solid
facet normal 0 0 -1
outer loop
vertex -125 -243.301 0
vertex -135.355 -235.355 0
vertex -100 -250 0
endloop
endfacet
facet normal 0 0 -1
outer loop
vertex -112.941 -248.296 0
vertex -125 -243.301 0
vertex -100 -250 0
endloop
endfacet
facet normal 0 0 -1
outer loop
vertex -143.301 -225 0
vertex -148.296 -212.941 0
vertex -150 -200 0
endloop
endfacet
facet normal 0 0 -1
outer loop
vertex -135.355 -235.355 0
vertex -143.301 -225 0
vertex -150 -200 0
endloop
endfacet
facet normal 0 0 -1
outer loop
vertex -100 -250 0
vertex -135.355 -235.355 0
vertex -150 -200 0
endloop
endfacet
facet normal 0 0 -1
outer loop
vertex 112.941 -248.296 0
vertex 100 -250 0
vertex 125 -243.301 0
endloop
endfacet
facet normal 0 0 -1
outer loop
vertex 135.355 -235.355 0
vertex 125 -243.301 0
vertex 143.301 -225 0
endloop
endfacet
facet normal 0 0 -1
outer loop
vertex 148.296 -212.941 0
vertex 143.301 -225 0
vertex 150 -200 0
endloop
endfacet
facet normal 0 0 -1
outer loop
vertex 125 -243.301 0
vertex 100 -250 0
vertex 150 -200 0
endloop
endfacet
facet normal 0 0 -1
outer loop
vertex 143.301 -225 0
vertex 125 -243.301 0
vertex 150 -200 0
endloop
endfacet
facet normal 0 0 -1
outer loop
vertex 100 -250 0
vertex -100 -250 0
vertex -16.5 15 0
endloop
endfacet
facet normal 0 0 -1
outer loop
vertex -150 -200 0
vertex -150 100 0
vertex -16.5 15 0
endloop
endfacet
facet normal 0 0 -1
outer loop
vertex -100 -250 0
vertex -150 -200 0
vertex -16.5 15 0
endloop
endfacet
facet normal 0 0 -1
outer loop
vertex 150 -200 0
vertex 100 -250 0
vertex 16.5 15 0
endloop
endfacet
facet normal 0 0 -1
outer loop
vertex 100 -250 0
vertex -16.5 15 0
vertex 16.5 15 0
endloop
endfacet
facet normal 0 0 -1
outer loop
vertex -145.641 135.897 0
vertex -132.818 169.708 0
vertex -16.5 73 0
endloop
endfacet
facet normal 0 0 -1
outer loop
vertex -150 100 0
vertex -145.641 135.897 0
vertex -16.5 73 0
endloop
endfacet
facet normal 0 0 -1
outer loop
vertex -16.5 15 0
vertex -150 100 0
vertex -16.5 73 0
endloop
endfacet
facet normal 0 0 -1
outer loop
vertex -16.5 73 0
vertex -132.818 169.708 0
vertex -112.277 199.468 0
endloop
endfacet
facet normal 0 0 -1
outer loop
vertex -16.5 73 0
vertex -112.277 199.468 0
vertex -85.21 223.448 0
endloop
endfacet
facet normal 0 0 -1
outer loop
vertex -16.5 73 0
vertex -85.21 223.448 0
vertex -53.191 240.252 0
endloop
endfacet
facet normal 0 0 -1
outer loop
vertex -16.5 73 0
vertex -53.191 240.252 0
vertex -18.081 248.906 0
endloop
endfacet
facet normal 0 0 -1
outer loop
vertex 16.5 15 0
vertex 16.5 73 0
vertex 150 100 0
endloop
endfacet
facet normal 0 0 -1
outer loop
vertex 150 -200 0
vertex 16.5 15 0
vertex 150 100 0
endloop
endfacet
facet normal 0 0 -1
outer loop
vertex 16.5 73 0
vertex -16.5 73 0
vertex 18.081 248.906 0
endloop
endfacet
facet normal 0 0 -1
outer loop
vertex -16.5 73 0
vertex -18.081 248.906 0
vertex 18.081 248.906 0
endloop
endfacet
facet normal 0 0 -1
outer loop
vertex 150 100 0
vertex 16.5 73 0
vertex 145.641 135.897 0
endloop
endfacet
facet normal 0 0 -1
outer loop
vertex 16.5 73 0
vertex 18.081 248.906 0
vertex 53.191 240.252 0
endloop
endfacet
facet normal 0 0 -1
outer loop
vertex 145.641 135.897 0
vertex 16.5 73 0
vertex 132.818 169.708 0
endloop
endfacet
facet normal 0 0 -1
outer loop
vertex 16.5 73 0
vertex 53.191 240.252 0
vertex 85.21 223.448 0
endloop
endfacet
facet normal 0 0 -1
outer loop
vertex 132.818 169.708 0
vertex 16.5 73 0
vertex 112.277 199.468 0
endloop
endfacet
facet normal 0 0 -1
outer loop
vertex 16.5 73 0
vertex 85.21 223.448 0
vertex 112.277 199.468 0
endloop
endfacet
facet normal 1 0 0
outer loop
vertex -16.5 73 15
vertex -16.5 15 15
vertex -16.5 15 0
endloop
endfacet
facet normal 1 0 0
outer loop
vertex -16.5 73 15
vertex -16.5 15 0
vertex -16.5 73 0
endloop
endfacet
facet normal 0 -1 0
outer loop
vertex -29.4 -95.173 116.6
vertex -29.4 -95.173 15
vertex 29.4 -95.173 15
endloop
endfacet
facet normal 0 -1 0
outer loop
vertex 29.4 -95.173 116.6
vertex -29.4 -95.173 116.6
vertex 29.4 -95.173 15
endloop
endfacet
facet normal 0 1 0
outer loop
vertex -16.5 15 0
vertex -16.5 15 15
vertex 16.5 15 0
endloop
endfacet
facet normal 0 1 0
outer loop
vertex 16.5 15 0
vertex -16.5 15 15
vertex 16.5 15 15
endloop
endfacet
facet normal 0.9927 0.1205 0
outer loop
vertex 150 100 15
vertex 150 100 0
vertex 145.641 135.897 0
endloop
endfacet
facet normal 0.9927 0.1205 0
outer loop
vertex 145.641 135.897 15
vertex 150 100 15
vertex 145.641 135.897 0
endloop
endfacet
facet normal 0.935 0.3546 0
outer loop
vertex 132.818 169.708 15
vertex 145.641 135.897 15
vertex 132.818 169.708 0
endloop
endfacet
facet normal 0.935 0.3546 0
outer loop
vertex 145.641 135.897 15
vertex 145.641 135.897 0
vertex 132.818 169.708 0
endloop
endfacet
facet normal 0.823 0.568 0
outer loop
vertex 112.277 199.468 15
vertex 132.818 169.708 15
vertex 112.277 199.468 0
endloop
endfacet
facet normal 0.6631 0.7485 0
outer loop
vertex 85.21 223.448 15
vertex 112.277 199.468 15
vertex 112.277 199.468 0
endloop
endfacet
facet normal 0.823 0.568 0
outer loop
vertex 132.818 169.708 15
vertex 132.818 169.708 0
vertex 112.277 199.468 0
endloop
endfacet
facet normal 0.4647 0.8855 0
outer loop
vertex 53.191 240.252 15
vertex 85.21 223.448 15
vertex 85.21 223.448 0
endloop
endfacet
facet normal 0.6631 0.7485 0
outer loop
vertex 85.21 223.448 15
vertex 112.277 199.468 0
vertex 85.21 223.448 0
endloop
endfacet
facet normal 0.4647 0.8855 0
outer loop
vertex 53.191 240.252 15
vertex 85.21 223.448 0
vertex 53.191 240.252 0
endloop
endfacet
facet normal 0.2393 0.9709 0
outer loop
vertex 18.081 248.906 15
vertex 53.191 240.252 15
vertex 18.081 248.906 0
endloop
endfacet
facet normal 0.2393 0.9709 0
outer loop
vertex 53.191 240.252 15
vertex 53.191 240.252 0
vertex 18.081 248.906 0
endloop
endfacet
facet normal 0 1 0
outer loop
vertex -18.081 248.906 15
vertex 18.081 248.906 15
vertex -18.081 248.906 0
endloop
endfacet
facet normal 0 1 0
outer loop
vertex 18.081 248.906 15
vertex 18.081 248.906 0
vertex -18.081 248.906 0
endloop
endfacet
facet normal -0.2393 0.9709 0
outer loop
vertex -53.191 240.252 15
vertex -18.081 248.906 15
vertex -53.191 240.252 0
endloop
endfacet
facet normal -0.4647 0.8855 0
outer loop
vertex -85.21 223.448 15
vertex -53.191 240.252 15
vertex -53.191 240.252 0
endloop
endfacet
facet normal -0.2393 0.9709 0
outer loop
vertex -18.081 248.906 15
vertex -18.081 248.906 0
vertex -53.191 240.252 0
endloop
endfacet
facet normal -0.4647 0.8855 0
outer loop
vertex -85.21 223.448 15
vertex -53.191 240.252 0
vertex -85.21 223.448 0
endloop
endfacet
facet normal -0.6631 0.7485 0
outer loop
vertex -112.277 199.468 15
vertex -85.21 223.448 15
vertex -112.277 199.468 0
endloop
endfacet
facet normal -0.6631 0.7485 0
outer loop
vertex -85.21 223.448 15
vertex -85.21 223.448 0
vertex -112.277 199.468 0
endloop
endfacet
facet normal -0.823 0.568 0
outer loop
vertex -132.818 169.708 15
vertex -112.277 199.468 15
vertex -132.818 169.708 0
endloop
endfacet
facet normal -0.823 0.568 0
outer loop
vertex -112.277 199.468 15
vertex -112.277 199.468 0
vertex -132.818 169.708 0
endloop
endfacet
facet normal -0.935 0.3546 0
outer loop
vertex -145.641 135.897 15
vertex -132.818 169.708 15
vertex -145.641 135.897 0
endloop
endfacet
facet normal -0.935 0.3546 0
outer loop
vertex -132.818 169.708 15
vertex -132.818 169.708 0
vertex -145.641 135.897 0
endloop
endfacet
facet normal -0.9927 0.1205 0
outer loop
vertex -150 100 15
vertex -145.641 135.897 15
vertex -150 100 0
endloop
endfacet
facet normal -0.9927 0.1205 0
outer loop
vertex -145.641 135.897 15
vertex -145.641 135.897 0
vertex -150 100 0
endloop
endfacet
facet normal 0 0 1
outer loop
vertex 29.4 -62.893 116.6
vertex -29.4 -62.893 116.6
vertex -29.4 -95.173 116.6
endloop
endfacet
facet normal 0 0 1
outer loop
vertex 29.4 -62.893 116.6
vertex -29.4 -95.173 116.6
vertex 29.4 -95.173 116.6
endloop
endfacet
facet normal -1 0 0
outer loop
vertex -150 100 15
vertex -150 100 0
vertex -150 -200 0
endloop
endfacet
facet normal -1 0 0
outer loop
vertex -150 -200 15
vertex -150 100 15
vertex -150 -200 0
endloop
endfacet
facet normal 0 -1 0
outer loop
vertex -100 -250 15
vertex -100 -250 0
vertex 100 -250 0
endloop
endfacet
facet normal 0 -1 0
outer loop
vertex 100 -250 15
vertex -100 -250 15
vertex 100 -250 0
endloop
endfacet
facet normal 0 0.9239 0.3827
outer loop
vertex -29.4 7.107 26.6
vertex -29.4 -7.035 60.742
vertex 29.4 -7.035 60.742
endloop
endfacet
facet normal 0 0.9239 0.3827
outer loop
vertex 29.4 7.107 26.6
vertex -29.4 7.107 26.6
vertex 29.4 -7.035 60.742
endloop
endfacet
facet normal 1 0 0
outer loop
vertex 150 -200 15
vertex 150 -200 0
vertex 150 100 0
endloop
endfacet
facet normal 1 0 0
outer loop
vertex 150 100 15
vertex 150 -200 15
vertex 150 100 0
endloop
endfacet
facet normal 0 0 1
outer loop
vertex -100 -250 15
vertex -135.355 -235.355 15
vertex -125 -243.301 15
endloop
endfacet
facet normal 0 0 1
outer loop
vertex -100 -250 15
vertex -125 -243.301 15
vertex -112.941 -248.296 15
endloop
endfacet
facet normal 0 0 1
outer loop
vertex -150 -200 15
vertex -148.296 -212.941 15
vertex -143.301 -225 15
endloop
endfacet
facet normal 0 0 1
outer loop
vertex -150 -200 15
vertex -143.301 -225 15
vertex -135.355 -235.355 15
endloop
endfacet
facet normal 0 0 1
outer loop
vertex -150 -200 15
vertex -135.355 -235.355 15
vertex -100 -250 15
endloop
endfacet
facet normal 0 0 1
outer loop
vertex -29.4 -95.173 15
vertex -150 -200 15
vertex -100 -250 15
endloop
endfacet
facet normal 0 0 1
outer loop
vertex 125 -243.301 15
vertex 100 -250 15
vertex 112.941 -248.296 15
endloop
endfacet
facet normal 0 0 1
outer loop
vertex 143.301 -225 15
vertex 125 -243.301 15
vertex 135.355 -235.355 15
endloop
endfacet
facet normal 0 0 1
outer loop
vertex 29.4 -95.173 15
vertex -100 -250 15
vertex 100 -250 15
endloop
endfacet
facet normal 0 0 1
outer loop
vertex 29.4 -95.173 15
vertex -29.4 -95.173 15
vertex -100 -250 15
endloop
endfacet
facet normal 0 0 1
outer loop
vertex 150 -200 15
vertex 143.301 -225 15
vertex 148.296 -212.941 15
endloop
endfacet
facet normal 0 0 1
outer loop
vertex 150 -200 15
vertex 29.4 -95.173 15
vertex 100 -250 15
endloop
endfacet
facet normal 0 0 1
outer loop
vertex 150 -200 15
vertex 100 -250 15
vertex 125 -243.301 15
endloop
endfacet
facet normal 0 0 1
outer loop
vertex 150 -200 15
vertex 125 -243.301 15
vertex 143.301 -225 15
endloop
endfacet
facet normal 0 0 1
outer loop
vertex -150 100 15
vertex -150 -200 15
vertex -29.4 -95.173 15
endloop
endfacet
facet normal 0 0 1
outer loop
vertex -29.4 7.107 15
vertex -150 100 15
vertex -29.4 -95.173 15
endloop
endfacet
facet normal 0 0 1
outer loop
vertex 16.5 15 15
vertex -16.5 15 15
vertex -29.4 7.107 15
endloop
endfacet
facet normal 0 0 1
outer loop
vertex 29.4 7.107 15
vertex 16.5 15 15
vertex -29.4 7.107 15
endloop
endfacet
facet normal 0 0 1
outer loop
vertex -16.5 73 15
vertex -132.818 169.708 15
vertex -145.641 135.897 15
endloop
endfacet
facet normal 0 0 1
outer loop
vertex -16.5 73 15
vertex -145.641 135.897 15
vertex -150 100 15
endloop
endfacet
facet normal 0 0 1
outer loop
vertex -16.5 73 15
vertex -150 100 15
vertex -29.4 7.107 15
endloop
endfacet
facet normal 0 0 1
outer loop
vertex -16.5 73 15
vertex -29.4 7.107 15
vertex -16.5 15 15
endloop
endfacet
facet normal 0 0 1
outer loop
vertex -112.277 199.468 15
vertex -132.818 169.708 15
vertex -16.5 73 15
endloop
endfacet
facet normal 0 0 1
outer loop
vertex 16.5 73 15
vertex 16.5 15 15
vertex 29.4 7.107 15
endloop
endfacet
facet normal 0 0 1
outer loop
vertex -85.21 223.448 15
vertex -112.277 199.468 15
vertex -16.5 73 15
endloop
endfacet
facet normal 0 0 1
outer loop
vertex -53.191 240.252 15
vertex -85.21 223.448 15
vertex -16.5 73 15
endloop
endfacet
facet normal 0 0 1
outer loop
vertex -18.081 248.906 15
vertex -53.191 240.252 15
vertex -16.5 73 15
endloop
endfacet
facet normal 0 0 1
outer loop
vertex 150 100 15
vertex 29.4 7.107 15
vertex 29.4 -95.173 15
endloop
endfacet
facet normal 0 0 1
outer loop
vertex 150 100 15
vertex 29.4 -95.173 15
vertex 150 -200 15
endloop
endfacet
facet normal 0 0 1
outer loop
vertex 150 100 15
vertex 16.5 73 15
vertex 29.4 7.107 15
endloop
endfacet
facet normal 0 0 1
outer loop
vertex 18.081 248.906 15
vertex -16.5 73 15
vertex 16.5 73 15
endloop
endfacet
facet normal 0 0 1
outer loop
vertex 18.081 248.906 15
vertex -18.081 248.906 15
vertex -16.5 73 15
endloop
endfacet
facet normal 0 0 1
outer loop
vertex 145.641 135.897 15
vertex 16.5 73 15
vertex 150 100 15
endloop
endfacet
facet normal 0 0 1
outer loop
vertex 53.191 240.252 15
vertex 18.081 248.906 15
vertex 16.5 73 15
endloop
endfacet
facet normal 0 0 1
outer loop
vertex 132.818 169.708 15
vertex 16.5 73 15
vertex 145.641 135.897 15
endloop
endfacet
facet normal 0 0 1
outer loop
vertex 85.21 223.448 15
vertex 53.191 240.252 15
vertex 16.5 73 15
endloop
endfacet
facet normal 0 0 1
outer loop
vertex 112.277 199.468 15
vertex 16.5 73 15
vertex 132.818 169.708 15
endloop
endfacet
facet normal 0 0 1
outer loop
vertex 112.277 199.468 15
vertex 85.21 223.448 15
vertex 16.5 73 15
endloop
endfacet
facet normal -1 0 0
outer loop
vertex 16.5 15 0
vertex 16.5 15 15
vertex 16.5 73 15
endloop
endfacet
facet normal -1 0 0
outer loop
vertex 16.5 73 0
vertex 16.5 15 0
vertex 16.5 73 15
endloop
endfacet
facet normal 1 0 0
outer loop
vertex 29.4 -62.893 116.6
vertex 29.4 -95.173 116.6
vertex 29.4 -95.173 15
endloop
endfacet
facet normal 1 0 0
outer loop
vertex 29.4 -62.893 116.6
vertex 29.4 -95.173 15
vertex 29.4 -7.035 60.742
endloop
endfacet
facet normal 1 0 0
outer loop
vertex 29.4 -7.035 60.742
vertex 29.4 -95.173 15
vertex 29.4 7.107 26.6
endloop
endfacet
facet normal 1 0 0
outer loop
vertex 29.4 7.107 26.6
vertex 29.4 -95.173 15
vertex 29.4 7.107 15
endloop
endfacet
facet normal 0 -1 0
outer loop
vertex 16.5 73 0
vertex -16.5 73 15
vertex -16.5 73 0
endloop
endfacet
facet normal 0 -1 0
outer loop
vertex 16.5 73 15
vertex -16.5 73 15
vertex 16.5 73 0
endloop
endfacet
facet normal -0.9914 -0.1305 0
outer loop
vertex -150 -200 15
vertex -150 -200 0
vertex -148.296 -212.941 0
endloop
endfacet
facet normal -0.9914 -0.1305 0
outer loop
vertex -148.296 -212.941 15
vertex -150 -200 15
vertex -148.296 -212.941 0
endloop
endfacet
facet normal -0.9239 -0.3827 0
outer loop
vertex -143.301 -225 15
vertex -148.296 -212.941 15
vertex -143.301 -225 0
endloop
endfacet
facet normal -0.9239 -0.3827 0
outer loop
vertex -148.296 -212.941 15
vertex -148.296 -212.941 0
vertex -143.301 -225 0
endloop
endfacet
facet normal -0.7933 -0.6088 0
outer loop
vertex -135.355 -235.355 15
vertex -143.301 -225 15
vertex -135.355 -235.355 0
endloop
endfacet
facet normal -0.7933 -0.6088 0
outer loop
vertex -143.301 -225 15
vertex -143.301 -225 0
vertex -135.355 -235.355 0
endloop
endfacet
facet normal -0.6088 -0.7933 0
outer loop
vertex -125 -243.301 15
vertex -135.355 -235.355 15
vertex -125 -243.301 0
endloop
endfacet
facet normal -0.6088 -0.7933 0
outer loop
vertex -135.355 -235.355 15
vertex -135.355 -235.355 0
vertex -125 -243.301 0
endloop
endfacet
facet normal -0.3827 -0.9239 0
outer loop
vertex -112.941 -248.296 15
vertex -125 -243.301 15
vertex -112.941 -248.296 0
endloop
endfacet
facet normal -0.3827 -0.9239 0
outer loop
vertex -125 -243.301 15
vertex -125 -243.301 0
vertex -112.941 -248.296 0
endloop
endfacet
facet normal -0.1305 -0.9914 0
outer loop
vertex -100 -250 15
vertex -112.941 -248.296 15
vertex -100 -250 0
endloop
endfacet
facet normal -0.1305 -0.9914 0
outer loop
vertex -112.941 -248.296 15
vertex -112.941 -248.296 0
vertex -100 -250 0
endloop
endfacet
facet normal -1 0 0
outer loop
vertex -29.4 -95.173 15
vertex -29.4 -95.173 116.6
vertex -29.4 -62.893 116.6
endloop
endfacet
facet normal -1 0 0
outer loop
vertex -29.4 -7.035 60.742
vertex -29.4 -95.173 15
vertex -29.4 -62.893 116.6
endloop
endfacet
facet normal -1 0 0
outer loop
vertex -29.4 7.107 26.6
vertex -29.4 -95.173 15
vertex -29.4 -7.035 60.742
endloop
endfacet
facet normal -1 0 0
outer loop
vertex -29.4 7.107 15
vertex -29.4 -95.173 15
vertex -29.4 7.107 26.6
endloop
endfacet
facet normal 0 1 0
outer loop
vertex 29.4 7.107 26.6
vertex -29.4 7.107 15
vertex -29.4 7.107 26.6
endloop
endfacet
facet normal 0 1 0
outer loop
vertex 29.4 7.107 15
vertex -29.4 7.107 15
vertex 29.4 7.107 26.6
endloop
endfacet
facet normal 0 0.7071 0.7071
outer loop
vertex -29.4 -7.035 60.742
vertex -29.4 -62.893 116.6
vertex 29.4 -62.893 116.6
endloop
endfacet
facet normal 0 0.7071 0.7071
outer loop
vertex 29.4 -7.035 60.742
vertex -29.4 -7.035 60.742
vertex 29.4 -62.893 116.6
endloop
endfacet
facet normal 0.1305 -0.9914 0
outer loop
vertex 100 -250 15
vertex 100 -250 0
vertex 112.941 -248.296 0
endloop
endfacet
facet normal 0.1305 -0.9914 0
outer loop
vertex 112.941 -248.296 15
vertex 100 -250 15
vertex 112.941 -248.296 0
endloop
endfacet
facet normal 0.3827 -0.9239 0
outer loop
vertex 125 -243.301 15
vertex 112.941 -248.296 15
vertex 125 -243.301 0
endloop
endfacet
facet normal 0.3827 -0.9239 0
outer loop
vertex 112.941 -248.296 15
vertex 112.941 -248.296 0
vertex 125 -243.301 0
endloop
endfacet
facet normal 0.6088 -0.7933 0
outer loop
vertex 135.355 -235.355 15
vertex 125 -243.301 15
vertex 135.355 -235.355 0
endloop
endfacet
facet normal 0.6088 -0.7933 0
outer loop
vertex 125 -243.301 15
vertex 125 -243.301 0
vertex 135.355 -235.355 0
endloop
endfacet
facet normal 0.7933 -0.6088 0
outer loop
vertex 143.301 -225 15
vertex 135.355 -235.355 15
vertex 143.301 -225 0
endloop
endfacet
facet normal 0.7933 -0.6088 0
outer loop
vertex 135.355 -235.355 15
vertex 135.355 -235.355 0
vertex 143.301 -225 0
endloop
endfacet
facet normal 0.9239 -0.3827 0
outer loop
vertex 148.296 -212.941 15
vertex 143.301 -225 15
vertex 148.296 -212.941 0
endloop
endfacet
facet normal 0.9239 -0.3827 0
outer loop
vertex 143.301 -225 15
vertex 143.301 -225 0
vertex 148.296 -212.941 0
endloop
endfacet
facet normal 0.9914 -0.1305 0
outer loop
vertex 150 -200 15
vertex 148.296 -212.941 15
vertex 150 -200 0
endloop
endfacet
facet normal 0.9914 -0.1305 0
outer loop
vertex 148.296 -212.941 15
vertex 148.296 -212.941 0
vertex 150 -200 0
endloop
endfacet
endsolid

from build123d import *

# Parameters (mm, degrees)
F1_DEPTH = 15
F2_W     = 33
F2_H     = 58
F3_DEPTH = 15.001
F4_W     = 58.8
F4_H     = 102.2799882368
F5_DEPTH = 101.6
F6_SIZE  = 70
F7_SIZE  = 20


with BuildPart() as f1:
    # F0 (on Top) → F1 (new body)
    with BuildSketch(Plane.XY):
        with BuildLine():
            Line((-100, -250), (100, -250))
            ThreePointArc((100, -250), (135.3553390593, -235.3553390593), (150, -200))
            Line((150, -200), (150, 100))
            ThreePointArc((150, 100), (0, 250), (-150, 100))
            Line((-150, 100), (-150, -200))
            ThreePointArc((-150, -200), (-135.3553390593, -235.3553390593), (-100, -250))
        make_face()
    extrude(amount=F1_DEPTH)

    # F2 (on face) → F3 (cut, through all)
    with BuildSketch(Plane.XY.offset(15)):
        with Locations((0, 44)):
            Rectangle(F2_W, F2_H)
    extrude(amount=-F3_DEPTH, mode=Mode.SUBTRACT)

    # F4 (on face) → F5 (join)
    with BuildSketch(Plane.XY.offset(15)):
        with Locations((0, -44.0329860869)):
            Rectangle(F4_W, F4_H)
    extrude(amount=F5_DEPTH)

    # F6
    f6_edges = [f1.edges().sort_by_distance(p)[0] for p in [
        (0, 7.107008, 116.6),
    ]]
    chamfer(f6_edges, length=F6_SIZE)

    # F7
    f7_edges = [f1.edges().sort_by_distance(p)[0] for p in [
        (0, 7.107008, 46.6),
    ]]
    chamfer(f7_edges, length=F7_SIZE)


solid = f1.part
